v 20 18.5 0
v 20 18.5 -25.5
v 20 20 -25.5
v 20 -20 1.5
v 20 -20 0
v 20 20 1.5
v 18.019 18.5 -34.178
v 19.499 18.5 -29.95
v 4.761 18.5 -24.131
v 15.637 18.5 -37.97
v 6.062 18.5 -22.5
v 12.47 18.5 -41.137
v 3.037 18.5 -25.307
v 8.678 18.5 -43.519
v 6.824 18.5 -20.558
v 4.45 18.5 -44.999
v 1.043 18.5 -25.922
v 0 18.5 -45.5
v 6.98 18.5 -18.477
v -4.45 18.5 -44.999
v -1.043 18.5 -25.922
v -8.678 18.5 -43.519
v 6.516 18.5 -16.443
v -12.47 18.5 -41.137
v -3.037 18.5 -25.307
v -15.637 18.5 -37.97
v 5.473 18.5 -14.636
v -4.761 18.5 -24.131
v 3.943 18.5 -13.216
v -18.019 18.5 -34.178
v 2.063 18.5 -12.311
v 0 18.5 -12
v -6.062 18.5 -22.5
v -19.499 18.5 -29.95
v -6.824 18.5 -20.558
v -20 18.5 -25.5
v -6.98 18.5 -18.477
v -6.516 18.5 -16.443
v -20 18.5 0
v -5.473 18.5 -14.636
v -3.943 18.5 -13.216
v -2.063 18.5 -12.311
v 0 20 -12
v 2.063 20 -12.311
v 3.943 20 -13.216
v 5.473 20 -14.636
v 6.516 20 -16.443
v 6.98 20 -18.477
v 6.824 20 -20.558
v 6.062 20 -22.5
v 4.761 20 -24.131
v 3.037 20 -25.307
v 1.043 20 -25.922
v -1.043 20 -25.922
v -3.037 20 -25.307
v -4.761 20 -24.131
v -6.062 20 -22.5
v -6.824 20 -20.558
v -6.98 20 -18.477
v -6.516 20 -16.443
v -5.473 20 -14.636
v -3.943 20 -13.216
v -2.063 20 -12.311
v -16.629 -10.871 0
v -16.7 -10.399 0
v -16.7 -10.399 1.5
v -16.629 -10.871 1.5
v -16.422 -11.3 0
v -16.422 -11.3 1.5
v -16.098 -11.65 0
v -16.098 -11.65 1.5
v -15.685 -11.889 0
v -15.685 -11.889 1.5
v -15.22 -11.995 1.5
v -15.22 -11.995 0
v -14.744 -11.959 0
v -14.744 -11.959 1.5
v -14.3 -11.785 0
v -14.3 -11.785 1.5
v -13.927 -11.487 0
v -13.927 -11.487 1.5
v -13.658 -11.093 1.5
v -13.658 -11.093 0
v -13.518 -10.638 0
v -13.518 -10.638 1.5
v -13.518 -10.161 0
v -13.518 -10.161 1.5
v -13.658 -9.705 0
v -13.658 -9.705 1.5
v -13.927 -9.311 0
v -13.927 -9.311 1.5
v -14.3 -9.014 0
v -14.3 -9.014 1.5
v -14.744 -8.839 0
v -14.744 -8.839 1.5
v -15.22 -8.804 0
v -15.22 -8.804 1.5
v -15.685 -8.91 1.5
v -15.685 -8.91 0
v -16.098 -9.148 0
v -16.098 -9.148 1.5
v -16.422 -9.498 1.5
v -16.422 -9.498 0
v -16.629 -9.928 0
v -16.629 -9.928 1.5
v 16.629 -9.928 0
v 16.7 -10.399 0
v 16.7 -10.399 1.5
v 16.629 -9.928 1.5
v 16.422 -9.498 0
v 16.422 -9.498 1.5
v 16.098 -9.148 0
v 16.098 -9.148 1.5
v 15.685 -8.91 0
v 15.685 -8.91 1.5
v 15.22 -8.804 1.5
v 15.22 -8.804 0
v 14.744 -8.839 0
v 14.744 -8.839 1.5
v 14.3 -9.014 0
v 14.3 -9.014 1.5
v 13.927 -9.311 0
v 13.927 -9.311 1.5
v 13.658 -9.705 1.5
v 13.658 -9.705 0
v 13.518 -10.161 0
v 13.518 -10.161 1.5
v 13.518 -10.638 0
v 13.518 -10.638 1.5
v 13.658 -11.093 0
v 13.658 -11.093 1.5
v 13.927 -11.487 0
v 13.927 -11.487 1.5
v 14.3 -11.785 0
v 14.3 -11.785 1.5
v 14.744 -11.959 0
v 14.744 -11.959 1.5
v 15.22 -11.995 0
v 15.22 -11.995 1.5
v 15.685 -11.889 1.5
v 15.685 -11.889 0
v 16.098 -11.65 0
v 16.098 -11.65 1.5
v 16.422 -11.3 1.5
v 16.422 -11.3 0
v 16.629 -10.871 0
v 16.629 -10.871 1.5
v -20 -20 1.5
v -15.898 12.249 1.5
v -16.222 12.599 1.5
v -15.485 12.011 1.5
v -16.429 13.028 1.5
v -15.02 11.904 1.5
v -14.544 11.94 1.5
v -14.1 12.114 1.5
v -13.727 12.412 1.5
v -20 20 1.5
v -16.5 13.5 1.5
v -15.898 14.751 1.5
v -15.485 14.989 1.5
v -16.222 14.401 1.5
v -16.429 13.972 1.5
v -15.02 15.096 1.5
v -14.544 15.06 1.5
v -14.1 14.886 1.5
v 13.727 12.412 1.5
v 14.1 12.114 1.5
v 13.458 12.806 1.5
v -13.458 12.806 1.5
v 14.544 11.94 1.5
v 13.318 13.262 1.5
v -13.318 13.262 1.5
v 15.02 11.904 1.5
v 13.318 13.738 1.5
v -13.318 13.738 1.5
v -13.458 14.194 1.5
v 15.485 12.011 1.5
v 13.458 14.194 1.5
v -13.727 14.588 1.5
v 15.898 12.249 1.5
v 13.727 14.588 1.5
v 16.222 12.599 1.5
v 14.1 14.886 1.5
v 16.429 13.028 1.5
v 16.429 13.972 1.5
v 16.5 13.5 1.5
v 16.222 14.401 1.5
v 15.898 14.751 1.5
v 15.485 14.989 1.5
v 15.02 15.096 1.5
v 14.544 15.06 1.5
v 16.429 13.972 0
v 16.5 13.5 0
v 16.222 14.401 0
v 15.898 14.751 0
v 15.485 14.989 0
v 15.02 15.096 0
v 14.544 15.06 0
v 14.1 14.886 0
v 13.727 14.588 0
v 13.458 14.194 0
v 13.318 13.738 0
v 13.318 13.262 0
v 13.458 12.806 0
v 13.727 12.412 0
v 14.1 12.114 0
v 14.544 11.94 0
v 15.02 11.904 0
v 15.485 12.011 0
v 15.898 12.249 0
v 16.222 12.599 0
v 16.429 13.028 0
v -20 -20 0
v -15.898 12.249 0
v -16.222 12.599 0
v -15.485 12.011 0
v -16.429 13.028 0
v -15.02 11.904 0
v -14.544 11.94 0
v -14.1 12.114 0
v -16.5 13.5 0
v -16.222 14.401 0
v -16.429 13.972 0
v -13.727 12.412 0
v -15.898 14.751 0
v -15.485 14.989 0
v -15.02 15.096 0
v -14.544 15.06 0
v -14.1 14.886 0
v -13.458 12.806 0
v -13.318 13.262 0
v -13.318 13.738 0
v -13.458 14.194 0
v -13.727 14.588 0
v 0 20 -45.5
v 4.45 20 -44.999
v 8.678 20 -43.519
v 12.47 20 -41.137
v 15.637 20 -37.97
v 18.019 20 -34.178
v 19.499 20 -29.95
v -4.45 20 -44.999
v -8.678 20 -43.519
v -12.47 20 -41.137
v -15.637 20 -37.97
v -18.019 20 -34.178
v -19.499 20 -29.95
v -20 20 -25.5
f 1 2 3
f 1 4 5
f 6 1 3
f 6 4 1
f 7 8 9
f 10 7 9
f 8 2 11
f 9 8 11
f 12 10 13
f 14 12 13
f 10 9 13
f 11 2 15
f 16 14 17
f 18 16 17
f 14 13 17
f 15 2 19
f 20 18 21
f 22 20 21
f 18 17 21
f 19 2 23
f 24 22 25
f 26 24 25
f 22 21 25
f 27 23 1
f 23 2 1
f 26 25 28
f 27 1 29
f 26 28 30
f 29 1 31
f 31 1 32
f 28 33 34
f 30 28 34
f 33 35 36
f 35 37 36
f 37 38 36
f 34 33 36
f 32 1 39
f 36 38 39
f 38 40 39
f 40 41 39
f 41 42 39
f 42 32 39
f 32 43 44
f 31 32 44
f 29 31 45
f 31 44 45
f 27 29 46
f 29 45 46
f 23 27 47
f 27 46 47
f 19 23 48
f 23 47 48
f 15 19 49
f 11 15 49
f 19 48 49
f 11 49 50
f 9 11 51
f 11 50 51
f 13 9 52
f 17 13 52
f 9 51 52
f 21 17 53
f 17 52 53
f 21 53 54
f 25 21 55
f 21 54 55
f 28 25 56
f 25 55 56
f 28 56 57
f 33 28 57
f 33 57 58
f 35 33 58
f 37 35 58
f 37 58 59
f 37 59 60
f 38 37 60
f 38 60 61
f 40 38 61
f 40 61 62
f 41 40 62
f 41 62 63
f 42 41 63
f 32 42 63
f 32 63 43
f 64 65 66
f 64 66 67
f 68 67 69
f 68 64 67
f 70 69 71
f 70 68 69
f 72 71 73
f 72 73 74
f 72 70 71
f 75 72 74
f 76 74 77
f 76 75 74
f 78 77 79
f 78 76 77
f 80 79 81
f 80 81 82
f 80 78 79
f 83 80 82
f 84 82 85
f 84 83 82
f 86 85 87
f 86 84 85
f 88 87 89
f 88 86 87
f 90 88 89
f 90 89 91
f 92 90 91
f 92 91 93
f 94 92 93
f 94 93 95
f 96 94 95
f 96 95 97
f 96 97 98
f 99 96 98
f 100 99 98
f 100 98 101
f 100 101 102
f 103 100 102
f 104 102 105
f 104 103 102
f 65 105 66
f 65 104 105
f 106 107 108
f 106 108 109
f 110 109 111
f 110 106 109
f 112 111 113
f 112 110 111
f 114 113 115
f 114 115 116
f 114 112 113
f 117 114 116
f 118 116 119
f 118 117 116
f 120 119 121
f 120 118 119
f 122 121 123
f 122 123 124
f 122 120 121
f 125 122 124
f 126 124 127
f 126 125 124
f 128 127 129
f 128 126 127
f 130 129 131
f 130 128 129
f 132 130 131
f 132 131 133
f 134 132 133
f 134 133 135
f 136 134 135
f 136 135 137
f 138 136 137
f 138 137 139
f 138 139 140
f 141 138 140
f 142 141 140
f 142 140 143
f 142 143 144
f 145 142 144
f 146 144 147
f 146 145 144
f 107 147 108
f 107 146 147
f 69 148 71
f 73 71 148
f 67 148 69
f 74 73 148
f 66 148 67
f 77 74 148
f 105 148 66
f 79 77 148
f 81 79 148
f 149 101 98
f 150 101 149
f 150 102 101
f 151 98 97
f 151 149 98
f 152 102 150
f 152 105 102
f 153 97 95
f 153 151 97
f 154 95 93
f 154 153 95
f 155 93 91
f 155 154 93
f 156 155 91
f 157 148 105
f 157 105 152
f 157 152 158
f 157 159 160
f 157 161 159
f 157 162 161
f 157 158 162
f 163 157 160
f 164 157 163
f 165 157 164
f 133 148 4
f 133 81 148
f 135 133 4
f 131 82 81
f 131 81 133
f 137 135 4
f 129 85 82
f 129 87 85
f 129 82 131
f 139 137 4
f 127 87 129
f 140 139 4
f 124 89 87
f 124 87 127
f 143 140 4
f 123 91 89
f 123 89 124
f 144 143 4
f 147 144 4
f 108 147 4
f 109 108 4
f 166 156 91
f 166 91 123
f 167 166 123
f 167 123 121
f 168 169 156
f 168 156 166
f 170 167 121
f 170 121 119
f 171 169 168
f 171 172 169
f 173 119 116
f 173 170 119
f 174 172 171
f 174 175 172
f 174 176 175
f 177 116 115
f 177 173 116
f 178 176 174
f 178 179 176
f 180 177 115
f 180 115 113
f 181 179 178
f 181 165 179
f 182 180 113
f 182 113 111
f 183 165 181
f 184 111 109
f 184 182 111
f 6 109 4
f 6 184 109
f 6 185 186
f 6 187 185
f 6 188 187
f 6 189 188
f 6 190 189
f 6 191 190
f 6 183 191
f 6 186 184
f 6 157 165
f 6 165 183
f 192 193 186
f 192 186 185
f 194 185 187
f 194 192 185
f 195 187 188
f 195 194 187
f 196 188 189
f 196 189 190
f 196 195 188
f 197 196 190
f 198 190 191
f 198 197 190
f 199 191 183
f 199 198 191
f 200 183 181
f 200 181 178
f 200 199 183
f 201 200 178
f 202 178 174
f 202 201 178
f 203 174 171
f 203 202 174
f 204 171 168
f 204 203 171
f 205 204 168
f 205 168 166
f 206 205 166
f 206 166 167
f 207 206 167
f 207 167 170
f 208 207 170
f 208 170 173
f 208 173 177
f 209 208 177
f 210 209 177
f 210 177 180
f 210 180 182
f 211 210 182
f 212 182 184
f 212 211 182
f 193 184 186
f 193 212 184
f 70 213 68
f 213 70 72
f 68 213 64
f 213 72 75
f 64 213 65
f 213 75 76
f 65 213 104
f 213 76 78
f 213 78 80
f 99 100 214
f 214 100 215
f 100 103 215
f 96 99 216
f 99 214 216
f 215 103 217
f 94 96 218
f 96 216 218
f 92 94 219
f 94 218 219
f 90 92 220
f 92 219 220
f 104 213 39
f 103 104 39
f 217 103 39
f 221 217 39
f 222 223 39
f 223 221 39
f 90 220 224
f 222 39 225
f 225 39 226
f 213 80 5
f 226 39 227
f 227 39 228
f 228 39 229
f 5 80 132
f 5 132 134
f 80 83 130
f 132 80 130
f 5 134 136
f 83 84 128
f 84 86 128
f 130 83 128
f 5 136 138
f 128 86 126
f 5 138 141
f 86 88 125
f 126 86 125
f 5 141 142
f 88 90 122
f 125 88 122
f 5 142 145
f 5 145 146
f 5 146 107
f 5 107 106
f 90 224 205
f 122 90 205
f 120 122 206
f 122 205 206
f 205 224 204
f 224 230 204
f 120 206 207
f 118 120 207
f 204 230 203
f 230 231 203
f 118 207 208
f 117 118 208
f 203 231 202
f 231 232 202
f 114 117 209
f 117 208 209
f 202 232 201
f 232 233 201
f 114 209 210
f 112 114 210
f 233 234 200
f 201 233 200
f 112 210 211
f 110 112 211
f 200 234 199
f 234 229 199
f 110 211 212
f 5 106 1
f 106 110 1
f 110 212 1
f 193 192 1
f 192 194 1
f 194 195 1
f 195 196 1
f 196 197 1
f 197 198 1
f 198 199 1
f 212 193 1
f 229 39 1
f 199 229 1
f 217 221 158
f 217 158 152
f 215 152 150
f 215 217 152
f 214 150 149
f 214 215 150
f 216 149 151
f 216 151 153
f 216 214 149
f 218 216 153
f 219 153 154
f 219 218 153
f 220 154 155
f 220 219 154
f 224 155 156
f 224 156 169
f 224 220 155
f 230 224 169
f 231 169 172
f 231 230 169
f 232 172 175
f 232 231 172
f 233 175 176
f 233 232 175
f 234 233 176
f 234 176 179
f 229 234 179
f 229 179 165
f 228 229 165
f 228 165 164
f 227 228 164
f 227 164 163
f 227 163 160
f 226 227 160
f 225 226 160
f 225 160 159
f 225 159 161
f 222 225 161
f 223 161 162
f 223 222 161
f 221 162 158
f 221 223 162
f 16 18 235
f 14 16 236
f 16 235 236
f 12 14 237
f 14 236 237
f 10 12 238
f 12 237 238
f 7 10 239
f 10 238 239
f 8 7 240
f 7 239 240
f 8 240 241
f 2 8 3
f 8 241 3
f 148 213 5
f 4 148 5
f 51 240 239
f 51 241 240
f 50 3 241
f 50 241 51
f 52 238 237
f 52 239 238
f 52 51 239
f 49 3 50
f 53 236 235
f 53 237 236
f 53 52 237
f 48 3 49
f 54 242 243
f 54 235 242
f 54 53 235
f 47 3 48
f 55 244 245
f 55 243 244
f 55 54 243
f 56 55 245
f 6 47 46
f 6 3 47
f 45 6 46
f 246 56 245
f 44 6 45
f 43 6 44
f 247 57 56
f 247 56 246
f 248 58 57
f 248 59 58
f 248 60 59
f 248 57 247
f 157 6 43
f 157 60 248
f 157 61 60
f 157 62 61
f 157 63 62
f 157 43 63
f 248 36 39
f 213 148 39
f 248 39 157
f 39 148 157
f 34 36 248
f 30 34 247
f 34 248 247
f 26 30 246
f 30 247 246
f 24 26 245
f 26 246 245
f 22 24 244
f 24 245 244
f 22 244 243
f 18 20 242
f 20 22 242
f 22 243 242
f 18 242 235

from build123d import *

# Parameters (mm, degrees)
SKETCH1_W           = 40
SKETCH1_H           = 40
SKETCH1_R           = 1.6
BOSS_EXTRUDE1_DEPTH = 1.5
SKETCH3_W           = 40
SKETCH3_H           = 1.5
BOSS_EXTRUDE2_DEPTH = 45.5
CUT_EXTRUDE1_DEPTH  = 64.798510954
SKETCH5_R           = 7
CUT_EXTRUDE2_DEPTH  = 64.798510954


with BuildPart() as part:
    # Sketch1 → Boss-Extrude1 (new body)
    with BuildSketch(Plane.XY):
        Rectangle(SKETCH1_W, SKETCH1_H)
        with Locations((14.9, 13.5)):
            Circle(SKETCH1_R, mode=Mode.SUBTRACT)
        with Locations(Location((-14.9, 13.5, 0), (0, 0, 180))):
            Circle(SKETCH1_R, mode=Mode.SUBTRACT)
        with Locations((15.1, -10.399163165)):
            Circle(SKETCH1_R, mode=Mode.SUBTRACT)
        with Locations(Location((-15.1, -10.399163165, 0), (0, 0, 180))):
            Circle(SKETCH1_R, mode=Mode.SUBTRACT)
    extrude(amount=BOSS_EXTRUDE1_DEPTH)

    # Sketch3 → Boss-Extrude2 (add)
    with BuildSketch(Plane(origin=(0, 0, 0), x_dir=(-1, 0, 0), z_dir=(0, 0, -1))):
        with Locations((0, 19.25)):
            Rectangle(SKETCH3_W, SKETCH3_H)
    extrude(amount=BOSS_EXTRUDE2_DEPTH)

    # Sketch4 → Cut-Extrude1 (cut, through all)
    with BuildSketch(Plane(origin=(0, 20, 0), x_dir=(1, 0, 0), z_dir=(0, 1, 0))):
        with BuildLine():
            ThreePointArc((0, 45.5), (14.142135624, 39.642135624), (20, 25.5))
            Line((20, 25.5), (20, 45.5))
            Line((20, 45.5), (0, 45.5))
        make_face()
        with BuildLine():
            Line((-20, 45.5), (-20, 25.5))
            ThreePointArc((-20, 25.5), (-14.142135624, 39.642135624), (0, 45.5))
            Line((0, 45.5), (-20, 45.5))
        make_face()
    extrude(amount=-CUT_EXTRUDE1_DEPTH, mode=Mode.SUBTRACT)

    # Sketch5 → Cut-Extrude2 (cut, through all)
    with BuildSketch(Plane(origin=(0, 20, 0), x_dir=(1, 0, 0), z_dir=(0, 1, 0))):
        with Locations(Location((0, 19, 0), (0, 0, 270))):
            Circle(SKETCH5_R)
    extrude(amount=-CUT_EXTRUDE2_DEPTH, mode=Mode.SUBTRACT)


solid = part.part
